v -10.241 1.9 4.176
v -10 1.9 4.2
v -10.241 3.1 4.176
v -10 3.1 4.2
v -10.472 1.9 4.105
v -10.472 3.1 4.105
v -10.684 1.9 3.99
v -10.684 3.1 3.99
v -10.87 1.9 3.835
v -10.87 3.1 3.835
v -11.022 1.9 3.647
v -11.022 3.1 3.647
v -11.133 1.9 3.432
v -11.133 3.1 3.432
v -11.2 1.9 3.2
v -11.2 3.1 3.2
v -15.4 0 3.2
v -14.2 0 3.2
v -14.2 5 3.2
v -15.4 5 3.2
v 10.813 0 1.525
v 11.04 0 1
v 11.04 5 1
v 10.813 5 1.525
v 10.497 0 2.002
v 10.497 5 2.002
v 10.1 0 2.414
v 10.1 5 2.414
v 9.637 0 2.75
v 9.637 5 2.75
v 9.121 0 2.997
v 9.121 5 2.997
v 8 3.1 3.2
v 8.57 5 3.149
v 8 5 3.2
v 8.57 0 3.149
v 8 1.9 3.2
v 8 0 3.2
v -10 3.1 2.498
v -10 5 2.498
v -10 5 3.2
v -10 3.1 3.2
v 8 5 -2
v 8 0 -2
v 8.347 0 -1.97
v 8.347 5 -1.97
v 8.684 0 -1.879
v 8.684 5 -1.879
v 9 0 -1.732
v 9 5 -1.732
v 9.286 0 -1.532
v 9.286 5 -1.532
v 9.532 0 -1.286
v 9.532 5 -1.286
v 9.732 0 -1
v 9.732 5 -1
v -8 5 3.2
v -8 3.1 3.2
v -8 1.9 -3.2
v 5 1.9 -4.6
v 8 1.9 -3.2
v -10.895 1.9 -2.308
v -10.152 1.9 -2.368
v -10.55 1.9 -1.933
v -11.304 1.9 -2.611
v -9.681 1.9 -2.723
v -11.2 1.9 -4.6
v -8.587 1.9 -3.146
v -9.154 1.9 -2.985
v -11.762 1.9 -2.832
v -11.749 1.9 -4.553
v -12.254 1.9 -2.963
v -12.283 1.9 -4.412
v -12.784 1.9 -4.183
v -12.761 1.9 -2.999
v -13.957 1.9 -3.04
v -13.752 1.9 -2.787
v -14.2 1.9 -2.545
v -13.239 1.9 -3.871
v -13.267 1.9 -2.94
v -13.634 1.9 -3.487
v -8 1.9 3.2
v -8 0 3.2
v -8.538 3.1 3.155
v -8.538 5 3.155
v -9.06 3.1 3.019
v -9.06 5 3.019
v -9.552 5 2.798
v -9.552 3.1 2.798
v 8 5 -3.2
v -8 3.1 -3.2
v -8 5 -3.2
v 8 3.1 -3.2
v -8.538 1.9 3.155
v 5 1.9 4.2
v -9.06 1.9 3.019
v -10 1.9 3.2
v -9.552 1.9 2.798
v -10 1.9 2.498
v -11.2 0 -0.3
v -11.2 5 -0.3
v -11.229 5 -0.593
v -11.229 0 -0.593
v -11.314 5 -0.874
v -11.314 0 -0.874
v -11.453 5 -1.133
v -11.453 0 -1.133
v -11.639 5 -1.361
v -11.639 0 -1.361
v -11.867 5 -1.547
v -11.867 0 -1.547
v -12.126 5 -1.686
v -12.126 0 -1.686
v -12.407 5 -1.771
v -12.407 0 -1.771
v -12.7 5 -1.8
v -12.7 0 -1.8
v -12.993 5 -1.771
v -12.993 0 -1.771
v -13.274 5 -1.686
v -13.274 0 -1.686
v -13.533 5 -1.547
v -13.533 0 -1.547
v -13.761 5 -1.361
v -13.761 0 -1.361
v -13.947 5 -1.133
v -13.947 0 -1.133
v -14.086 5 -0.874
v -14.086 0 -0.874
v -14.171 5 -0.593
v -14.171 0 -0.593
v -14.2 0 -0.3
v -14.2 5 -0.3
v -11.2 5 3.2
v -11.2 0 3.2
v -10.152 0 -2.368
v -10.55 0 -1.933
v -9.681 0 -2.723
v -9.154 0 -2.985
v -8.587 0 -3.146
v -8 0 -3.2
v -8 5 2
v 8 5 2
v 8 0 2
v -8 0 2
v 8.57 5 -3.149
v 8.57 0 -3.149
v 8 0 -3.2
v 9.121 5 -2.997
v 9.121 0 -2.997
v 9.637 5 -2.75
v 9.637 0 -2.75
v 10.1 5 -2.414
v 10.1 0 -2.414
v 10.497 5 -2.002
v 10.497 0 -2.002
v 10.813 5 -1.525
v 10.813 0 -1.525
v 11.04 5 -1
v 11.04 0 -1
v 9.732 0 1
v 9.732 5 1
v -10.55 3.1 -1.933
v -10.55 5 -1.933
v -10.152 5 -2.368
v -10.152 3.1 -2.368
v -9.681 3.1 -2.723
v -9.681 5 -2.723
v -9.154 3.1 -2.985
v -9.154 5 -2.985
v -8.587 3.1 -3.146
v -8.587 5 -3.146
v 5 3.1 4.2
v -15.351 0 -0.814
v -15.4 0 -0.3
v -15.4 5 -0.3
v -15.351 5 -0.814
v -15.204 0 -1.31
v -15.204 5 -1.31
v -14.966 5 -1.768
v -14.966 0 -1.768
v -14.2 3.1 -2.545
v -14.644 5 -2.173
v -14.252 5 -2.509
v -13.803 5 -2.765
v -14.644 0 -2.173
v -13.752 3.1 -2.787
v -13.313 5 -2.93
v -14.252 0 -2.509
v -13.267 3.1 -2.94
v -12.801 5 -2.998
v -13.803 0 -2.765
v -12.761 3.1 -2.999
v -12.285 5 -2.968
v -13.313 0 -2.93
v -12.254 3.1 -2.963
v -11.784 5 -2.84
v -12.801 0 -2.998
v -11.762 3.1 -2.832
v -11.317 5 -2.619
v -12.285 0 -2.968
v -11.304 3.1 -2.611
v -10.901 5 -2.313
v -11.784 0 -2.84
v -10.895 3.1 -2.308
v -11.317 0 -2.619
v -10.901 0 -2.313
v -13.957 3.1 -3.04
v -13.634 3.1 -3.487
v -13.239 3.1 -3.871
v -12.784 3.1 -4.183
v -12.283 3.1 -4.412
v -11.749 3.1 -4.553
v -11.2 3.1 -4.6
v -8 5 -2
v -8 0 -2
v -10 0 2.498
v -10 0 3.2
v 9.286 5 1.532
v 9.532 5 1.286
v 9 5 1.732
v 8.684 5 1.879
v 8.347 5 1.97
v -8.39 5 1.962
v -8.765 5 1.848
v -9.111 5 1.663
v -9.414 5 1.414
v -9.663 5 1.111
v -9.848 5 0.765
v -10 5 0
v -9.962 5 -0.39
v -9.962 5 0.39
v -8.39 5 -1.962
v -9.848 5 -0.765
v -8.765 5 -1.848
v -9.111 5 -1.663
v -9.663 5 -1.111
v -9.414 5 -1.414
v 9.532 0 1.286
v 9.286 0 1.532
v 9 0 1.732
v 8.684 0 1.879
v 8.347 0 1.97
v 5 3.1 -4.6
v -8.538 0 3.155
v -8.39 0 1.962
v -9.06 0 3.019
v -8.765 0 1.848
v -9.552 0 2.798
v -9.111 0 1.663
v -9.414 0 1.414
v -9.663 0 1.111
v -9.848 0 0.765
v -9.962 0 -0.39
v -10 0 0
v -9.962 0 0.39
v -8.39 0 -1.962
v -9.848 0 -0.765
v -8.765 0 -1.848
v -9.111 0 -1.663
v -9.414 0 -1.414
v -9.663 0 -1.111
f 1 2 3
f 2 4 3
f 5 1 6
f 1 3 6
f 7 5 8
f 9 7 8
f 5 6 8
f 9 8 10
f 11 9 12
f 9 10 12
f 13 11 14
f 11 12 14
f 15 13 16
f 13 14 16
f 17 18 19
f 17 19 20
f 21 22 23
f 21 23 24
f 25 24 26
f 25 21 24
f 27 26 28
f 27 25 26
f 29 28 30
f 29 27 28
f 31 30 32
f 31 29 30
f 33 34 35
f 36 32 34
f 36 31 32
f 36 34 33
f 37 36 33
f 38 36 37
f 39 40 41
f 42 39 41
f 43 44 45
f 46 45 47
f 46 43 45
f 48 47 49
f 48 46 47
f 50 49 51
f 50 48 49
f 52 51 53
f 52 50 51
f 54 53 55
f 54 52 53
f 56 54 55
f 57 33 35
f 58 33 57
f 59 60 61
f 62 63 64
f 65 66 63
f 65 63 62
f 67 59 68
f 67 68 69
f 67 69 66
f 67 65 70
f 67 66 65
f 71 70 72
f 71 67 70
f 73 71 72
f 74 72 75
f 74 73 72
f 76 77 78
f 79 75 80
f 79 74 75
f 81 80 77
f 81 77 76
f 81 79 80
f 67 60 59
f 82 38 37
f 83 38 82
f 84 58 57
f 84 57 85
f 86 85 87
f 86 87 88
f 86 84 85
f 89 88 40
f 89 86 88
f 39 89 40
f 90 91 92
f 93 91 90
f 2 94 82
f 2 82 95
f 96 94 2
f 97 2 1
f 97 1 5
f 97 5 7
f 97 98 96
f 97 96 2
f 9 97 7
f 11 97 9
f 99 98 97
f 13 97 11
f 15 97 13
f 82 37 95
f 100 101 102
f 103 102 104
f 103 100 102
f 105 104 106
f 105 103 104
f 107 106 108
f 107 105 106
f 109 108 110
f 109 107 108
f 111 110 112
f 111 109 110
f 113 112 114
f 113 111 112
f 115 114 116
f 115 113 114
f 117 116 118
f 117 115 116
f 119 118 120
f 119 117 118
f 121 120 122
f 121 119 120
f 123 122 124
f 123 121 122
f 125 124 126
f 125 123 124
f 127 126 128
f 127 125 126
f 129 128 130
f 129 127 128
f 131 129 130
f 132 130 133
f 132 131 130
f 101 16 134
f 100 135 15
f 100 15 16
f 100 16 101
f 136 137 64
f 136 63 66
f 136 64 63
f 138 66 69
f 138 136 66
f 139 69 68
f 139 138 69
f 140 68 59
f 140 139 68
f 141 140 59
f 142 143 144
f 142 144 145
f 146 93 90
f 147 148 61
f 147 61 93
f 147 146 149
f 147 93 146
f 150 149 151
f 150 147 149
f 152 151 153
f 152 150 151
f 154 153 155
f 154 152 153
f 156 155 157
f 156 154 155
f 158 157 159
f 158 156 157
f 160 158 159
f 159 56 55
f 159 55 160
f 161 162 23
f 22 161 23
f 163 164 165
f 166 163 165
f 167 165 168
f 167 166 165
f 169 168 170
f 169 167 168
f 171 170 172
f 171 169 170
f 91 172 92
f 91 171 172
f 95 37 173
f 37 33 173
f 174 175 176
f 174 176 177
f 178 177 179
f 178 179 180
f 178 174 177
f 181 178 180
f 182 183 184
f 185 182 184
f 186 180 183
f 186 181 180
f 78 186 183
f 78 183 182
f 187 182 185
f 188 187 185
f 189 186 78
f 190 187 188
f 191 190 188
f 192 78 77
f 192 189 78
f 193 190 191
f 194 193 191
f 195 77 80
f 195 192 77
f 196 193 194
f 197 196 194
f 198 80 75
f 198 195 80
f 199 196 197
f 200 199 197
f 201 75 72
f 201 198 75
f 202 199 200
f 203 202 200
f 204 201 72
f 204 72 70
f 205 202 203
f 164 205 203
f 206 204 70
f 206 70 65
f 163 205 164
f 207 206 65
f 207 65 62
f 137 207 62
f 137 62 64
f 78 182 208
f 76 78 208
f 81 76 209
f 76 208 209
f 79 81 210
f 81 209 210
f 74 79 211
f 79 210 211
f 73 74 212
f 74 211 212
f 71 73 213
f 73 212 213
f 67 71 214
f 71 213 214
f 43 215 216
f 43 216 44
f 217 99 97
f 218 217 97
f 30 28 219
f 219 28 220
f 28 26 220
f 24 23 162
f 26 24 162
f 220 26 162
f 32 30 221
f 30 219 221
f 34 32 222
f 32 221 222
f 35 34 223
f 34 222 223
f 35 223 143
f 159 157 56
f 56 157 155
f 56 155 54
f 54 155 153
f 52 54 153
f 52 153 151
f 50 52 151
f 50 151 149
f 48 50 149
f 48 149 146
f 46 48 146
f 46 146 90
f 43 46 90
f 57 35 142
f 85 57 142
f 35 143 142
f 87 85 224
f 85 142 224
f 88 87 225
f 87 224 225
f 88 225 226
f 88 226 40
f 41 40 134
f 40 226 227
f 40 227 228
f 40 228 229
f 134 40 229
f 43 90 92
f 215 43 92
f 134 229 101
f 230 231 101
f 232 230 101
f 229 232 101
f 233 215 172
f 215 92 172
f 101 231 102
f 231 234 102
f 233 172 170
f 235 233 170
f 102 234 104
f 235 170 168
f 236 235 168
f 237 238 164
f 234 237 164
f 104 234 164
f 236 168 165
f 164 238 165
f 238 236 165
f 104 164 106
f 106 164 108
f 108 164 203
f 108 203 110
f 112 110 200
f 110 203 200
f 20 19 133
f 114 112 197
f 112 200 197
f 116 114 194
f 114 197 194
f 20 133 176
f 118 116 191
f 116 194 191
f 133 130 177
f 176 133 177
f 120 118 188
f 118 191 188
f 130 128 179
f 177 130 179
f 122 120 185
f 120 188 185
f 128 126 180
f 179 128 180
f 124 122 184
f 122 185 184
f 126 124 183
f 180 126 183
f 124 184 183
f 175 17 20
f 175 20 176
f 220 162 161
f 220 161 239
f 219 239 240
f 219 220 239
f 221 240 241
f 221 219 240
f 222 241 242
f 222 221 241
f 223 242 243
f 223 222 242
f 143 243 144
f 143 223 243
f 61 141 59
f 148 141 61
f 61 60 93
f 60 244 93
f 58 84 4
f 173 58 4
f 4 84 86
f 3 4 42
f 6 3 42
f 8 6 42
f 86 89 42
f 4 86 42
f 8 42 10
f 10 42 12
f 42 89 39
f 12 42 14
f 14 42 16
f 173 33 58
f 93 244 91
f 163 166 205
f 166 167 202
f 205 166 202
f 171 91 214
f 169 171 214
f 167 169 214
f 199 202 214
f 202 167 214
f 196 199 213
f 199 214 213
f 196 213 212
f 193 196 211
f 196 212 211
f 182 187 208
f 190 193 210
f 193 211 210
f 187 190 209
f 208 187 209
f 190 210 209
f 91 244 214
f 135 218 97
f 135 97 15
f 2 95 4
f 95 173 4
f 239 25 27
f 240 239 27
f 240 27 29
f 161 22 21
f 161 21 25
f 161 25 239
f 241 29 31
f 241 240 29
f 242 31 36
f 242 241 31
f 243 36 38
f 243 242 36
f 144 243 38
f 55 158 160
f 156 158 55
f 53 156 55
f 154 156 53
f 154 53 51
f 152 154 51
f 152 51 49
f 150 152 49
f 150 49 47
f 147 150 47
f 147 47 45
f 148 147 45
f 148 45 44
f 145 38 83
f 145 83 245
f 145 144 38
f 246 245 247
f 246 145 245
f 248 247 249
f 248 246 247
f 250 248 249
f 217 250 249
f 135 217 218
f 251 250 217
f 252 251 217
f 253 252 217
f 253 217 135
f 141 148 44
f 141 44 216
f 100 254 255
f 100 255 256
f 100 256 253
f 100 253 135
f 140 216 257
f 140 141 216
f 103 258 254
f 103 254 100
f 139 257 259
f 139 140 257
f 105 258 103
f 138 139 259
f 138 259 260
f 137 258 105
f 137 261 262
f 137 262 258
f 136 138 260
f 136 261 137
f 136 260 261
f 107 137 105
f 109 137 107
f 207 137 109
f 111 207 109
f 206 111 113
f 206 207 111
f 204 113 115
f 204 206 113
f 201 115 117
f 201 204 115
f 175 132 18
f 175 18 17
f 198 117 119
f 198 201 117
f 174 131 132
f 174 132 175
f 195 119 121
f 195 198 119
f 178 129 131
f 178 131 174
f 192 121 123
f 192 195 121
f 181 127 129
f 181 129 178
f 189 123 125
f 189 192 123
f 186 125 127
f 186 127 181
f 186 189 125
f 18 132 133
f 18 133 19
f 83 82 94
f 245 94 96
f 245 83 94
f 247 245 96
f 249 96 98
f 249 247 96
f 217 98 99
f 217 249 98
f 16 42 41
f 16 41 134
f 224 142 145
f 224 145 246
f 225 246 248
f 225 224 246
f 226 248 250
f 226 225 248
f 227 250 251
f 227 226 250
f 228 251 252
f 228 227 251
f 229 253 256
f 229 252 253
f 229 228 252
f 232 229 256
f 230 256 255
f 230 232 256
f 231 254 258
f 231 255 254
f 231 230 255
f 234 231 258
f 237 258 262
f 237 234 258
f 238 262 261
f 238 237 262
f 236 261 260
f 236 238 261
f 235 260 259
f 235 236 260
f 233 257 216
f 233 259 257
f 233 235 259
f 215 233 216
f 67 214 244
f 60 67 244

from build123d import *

# Parameters (mm, degrees)
BOSS_EXTRUDE1_DEPTH = 5
CUT_EXTRUDE1_DEPTH  = 6
SKETCH4_W           = 4
SKETCH4_H           = 2
CUT_EXTRUDE2_DEPTH  = 6
BOSS_EXTRUDE2_DEPTH = 5
CUT_EXTRUDE3_DEPTH  = 6
BOSS_EXTRUDE3_DEPTH = 0.6
BOSS_EXTRUDE4_DEPTH = 0.6


with BuildPart() as part:
    # Sketch1 → Boss-Extrude1 (new body)
    with BuildSketch(Plane(origin=(0, 0, 0), x_dir=(1, 0, 0), z_dir=(0, 1, 0))):
        with BuildLine():
            Line((-8, 3.2), (8, 3.2))
            ThreePointArc((8, 3.2), (11.2, 0), (8, -3.2))
            Line((8, -3.2), (-8, -3.2))
            ThreePointArc((-8, -3.2), (-11.2, 0), (-8, 3.2))
        make_face()
    extrude(amount=BOSS_EXTRUDE1_DEPTH)

    # Sketch3 → Cut-Extrude1 (cut, through all)
    with BuildSketch(Plane(origin=(0, 5, 0), x_dir=(1, 0, 0), z_dir=(0, 1, 0))):
        with BuildLine():
            Line((-8, 2), (8, 2))
            ThreePointArc((8, 2), (10, 0), (8, -2))
            Line((8, -2), (-8, -2))
            ThreePointArc((-8, -2), (-10, 0), (-8, 2))
        make_face()
    extrude(amount=-CUT_EXTRUDE1_DEPTH, mode=Mode.SUBTRACT)

    # Sketch4 → Cut-Extrude2 (cut, through all)
    with BuildSketch(Plane(origin=(0, 5, 0), x_dir=(1, 0, 0), z_dir=(0, 1, 0))):
        with Locations((10.5, 0)):
            Rectangle(SKETCH4_W, SKETCH4_H)
    extrude(amount=-CUT_EXTRUDE2_DEPTH, mode=Mode.SUBTRACT)

    # Sketch5 → Boss-Extrude2 (add)
    with BuildSketch(Plane.XZ):
        with BuildLine():
            Line((-10, -0.3), (-10, 3.2))
            Line((-10, 3.2), (-15.4, 3.2))
            Line((-15.4, 3.2), (-15.4, -0.3))
            ThreePointArc((-15.4, -0.3), (-12.7, -3), (-10, -0.3))
        make_face()
    extrude(amount=-BOSS_EXTRUDE2_DEPTH)

    # Sketch7 → Cut-Extrude3 (cut, through all)
    with BuildSketch(Plane.XZ):
        with BuildLine():
            Line((-14.2, -0.3), (-14.2, 3.2))
            Line((-14.2, 3.2), (-11.2, 3.2))
            Line((-11.2, 3.2), (-11.2, -0.3))
            ThreePointArc((-11.2, -0.3), (-12.7, -1.8), (-14.2, -0.3))
        make_face()
    extrude(amount=-CUT_EXTRUDE3_DEPTH, mode=Mode.SUBTRACT)

    # Sketch8 → Boss-Extrude3 (add, symmetric)
    with BuildSketch(Plane(origin=(0, 2.5, 0), x_dir=(1, 0, 0), z_dir=(0, 1, 0))):
        with BuildLine():
            Line((-11.2, 4.6), (5, 4.6))
            Line((5, 4.6), (8, 3.2))
            Line((8, 3.2), (-8, 3.2))
            ThreePointArc((-8, 3.2), (-9.423654515, 2.86586947), (-10.550005007, 1.933254888))
            ThreePointArc((-10.550005007, 1.933254888), (-12.253704481, 2.962859424), (-14.2, 2.544994432))
            ThreePointArc((-14.2, 2.544994432), (-13.018175451, 4.036985667), (-11.2, 4.6))
        make_face()
    extrude(amount=BOSS_EXTRUDE3_DEPTH, both=True)

    # Sketch9 → Boss-Extrude4 (add, symmetric)
    with BuildSketch(Plane(origin=(0, 2.5, 0), x_dir=(1, 0, 0), z_dir=(0, 1, 0))):
        with BuildLine():
            Line((-8, -3.2), (8, -3.2))
            Line((8, -3.2), (5, -4.2))
            Line((5, -4.2), (-10, -4.2))
            ThreePointArc((-10, -4.2), (-10.781024968, -3.917229961), (-11.2, -3.2))
            Line((-11.2, -3.2), (-10, -3.2))
            Line((-10, -3.2), (-10, -2.497999199))
            ThreePointArc((-10, -2.497999199), (-9.059811908, -3.019403703), (-8, -3.2))
        make_face()
    extrude(amount=BOSS_EXTRUDE4_DEPTH, both=True)


solid = part.part
